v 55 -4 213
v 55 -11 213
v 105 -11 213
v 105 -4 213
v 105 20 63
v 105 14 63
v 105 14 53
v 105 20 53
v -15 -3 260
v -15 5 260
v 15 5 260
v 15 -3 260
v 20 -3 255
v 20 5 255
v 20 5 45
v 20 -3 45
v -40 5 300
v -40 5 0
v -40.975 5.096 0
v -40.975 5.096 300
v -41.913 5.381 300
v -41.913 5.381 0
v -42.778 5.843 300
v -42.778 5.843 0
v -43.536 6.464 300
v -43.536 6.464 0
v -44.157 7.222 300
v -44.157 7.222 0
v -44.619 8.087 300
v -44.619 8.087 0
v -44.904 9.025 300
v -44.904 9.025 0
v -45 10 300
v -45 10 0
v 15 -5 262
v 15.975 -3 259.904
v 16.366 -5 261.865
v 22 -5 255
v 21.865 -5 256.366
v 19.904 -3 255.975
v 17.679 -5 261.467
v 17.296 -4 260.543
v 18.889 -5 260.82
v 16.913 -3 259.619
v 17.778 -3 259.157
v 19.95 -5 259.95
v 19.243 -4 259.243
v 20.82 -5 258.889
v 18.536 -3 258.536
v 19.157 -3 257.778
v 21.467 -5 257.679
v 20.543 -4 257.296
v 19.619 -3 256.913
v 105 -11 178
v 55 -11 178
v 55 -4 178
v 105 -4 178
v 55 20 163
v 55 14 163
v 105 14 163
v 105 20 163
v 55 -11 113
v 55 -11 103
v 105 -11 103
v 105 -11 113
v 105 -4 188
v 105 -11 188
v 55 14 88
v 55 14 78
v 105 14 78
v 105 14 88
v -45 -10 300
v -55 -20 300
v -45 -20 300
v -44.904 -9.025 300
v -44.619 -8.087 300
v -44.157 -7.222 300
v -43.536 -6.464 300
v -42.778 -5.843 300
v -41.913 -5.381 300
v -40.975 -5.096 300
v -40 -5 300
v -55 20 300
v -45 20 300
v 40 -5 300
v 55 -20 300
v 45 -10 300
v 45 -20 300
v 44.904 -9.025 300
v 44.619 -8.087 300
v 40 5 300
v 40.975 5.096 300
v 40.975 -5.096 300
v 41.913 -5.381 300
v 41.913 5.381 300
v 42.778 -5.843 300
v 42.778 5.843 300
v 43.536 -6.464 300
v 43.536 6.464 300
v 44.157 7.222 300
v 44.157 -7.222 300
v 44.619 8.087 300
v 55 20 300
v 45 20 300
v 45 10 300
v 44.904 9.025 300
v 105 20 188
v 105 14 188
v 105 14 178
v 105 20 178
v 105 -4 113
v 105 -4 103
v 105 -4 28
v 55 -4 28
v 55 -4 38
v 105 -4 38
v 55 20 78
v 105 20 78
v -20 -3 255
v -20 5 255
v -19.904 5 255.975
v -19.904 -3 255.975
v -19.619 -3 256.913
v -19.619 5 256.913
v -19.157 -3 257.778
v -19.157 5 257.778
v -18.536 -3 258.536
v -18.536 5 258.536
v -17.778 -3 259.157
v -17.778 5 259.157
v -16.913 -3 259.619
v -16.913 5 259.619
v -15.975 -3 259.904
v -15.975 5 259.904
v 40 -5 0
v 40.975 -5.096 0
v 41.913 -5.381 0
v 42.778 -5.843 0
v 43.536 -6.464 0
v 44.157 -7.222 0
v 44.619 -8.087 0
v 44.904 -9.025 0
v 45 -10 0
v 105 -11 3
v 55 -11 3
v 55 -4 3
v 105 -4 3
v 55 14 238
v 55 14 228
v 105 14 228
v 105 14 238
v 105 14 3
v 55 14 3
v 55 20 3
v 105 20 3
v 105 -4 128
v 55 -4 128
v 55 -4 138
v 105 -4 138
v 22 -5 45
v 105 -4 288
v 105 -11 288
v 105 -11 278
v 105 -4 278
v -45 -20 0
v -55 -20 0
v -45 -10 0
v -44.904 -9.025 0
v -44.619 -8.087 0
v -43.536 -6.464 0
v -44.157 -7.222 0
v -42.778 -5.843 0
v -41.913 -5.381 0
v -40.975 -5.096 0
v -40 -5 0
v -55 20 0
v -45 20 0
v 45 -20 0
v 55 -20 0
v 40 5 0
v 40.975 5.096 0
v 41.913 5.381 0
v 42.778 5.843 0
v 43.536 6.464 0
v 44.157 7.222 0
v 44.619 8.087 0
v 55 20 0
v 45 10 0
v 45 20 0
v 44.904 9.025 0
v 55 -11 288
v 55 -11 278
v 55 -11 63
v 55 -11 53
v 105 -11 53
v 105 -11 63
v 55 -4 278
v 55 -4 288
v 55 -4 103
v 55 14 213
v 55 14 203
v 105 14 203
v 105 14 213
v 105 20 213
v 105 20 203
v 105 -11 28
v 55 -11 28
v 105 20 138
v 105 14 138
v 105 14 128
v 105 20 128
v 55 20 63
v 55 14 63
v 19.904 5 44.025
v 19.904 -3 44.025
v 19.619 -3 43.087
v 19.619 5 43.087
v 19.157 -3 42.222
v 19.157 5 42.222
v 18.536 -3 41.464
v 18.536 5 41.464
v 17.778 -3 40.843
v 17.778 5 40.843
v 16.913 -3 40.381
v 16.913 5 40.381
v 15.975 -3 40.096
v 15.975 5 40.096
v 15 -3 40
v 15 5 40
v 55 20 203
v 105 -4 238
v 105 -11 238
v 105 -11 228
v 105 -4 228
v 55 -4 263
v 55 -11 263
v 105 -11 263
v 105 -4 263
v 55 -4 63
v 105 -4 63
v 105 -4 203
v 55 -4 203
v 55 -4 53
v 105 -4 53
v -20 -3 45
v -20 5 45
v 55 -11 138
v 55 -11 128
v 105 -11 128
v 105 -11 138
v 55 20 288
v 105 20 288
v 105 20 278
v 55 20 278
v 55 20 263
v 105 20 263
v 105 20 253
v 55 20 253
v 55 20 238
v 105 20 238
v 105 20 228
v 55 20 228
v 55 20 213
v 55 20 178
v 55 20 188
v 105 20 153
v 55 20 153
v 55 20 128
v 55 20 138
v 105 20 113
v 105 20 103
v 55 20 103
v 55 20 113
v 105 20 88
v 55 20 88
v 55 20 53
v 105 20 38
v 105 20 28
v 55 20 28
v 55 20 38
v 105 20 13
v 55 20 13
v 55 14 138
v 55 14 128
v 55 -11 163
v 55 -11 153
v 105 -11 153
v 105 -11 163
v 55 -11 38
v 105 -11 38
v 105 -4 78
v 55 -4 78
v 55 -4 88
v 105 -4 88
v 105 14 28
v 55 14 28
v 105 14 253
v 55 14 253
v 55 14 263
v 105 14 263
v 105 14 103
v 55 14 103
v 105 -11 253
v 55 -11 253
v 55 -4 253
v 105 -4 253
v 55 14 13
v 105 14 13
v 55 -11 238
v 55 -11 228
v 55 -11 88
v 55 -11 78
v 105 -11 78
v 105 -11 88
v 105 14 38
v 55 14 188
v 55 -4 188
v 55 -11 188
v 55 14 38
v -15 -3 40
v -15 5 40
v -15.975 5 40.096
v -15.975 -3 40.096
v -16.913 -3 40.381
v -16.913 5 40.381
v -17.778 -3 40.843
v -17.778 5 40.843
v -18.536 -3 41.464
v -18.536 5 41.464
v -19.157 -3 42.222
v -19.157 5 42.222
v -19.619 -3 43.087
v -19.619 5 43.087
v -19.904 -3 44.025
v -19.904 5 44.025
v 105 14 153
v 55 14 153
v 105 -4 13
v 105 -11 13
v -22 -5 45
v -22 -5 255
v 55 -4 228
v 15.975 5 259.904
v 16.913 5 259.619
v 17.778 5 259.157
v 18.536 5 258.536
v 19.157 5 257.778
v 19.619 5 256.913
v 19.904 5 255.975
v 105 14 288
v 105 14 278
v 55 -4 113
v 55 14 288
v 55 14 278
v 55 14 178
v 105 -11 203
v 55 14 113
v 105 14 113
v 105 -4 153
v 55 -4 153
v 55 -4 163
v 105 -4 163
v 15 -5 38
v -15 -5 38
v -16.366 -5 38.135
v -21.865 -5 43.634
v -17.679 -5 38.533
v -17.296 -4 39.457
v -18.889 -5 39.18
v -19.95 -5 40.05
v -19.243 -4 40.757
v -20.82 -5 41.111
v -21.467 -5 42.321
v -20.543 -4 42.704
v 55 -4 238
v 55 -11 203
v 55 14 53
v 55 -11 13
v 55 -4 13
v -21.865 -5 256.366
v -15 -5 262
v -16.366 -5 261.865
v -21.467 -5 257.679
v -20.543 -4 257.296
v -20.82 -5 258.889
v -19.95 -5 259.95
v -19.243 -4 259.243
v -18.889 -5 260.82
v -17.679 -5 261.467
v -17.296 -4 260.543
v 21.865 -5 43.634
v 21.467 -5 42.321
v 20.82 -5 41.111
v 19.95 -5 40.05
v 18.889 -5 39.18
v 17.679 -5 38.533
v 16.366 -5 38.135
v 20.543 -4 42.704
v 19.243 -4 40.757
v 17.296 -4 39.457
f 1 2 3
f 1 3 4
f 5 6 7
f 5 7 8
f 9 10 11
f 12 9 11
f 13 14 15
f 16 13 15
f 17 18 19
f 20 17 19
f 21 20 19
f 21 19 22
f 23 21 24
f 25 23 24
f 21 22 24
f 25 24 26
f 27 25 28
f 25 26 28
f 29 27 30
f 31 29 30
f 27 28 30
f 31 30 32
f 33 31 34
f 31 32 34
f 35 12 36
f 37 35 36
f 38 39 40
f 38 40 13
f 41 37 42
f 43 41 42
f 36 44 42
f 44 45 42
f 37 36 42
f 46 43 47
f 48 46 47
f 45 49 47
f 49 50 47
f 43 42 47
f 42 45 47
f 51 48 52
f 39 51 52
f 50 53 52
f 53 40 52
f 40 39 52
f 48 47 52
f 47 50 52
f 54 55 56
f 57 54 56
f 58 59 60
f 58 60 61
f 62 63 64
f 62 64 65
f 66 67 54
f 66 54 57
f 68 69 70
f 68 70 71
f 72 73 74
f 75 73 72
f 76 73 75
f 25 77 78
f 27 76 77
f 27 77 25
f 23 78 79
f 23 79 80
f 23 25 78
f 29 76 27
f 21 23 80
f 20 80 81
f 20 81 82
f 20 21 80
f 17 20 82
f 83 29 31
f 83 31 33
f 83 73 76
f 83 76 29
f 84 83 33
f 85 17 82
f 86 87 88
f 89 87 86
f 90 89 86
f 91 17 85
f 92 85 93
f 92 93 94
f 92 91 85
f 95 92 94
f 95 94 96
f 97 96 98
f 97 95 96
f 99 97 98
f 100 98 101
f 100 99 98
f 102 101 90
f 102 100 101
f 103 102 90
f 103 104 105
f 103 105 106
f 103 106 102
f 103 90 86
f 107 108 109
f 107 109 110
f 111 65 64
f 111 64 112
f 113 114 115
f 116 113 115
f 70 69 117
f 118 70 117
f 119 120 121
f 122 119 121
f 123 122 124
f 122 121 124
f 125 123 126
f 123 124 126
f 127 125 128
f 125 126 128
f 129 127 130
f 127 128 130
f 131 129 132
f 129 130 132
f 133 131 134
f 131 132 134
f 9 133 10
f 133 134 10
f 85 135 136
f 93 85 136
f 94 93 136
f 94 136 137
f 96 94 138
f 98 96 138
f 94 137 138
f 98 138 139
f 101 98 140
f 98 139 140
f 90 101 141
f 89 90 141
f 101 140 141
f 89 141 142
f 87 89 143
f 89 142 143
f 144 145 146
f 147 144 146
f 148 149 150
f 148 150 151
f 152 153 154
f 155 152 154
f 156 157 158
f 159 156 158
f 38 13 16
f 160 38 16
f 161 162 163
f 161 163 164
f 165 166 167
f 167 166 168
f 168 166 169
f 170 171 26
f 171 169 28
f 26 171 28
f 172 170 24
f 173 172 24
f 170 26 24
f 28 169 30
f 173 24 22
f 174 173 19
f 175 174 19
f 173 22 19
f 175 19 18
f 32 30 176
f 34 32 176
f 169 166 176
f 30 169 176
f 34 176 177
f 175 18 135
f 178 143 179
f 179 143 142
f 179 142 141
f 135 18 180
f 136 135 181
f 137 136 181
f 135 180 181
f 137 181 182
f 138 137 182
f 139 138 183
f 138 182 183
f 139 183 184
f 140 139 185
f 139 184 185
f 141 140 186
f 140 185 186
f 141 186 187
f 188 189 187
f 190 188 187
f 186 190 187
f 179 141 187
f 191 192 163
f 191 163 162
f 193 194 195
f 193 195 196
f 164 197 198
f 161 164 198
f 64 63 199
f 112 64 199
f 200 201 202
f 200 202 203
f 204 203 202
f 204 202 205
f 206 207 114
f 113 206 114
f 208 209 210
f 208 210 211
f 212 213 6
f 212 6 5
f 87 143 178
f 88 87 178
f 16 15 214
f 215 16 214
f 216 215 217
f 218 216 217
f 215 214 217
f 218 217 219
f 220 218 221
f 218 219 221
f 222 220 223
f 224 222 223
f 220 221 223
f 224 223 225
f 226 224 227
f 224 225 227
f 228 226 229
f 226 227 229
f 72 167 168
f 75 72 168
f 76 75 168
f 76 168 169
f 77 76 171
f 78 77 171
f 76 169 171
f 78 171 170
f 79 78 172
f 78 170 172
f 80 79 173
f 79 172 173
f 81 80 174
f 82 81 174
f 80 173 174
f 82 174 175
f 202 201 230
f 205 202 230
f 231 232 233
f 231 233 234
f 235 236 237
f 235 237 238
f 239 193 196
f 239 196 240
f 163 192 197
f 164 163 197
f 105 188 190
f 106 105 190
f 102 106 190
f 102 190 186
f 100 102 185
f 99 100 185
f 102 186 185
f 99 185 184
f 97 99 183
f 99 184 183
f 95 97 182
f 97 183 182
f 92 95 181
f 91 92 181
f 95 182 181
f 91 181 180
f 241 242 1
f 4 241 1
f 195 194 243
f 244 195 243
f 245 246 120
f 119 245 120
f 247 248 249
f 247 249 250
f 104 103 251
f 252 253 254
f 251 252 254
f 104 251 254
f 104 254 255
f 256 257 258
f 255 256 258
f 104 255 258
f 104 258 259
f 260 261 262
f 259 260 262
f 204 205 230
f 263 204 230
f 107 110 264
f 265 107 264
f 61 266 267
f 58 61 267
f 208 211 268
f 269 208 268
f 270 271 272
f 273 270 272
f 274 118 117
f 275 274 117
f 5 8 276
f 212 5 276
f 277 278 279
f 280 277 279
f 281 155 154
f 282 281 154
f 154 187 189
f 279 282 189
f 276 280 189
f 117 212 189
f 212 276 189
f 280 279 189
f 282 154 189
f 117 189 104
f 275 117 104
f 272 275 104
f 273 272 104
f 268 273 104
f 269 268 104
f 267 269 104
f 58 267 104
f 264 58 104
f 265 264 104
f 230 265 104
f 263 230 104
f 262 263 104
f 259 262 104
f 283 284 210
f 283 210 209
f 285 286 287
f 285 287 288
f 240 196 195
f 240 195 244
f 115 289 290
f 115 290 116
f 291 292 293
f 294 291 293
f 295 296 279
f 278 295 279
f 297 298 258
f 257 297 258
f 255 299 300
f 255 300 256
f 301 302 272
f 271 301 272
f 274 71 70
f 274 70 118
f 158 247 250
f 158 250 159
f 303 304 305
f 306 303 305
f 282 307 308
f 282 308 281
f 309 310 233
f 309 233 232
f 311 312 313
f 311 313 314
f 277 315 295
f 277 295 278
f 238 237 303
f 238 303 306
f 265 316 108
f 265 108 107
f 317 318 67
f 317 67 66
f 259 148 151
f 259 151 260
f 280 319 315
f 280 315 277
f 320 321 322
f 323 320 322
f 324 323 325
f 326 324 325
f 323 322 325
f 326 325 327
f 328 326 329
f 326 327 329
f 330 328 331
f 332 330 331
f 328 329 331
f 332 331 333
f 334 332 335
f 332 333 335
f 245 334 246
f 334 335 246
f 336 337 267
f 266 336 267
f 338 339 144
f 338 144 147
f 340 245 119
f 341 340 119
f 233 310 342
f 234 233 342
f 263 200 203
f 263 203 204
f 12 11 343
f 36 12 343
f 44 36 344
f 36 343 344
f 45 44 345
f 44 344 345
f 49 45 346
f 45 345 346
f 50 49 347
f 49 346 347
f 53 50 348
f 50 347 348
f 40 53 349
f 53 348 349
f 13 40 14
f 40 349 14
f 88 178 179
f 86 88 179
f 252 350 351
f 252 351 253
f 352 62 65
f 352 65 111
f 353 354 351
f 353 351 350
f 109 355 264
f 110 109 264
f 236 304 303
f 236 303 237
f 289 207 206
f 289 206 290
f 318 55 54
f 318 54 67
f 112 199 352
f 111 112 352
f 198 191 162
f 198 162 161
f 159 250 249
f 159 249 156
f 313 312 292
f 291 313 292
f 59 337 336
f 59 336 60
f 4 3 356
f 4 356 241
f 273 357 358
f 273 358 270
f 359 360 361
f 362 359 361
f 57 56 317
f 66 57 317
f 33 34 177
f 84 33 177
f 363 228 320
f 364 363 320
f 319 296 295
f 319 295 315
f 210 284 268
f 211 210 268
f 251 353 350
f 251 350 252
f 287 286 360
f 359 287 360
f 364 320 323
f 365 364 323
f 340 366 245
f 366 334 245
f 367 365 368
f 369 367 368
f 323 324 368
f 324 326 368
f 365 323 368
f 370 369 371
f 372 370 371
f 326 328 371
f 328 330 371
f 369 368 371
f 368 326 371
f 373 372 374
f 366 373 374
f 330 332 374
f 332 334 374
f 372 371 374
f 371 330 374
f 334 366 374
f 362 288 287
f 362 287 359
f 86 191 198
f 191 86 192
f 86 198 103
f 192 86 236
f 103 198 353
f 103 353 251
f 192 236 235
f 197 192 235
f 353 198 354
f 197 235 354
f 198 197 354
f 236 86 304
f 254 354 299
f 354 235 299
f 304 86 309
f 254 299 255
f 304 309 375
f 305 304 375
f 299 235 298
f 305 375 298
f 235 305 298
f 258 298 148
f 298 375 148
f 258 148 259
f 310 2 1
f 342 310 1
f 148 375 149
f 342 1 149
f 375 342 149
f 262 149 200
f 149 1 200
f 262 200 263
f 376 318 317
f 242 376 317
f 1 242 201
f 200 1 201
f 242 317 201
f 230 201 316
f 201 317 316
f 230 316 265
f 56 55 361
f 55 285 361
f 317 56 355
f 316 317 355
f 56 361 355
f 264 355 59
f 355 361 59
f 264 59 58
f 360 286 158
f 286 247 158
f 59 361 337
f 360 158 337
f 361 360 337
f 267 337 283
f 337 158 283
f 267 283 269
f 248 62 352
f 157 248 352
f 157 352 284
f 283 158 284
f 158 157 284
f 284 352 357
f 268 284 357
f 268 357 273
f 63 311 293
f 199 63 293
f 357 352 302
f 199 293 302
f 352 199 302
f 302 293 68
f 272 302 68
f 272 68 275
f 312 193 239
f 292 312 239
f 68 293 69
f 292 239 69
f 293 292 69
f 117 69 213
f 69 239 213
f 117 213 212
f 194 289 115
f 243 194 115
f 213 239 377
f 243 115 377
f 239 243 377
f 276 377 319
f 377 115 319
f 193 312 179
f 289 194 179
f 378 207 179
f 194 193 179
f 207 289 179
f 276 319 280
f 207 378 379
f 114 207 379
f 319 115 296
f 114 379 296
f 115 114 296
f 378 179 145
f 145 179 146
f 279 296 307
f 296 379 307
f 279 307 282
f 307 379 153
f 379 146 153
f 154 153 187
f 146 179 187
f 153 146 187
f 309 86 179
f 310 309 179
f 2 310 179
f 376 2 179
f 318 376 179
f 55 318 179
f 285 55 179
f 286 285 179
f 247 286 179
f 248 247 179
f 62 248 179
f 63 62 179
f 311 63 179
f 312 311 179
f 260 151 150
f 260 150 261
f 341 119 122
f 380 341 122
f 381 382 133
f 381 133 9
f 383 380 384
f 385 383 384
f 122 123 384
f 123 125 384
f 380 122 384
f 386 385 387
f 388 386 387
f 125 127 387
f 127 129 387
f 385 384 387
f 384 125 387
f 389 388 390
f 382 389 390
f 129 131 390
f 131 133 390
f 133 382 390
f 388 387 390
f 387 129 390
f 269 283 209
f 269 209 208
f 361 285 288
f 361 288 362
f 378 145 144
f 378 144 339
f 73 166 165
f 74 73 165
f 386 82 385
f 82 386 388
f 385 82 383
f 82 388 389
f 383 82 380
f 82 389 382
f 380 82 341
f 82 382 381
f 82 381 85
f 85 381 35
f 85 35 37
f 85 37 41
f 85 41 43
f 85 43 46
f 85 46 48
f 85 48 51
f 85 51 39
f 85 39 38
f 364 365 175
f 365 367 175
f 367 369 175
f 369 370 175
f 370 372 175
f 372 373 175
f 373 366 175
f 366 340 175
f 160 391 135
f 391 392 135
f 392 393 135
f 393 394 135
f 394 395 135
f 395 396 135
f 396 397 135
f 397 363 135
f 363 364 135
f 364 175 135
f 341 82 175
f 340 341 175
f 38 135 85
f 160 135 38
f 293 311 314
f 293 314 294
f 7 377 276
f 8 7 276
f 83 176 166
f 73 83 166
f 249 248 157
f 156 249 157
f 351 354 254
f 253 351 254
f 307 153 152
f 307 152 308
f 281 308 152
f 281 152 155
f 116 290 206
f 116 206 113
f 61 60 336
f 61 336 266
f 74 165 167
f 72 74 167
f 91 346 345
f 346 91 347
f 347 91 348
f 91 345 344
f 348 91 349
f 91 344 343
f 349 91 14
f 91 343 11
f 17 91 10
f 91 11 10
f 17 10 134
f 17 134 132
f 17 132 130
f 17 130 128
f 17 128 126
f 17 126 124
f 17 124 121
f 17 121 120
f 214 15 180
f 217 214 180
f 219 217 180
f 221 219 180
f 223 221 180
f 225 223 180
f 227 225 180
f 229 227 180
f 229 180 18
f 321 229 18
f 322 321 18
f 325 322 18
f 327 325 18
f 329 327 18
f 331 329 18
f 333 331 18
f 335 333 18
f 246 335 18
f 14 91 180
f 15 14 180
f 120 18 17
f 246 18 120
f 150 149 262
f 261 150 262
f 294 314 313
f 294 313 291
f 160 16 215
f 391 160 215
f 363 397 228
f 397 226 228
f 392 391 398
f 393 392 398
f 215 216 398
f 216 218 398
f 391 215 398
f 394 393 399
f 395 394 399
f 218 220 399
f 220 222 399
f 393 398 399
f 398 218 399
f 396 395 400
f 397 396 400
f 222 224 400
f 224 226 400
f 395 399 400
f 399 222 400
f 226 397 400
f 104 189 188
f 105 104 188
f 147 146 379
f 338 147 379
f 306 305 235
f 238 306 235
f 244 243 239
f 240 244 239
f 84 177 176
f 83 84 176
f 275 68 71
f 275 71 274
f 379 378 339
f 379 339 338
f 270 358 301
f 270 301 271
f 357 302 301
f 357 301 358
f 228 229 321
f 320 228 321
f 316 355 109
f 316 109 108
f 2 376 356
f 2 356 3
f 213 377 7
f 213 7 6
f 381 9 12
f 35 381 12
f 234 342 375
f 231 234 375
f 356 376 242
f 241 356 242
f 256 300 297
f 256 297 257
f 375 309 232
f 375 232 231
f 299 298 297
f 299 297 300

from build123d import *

# Parameters (mm, degrees)
F1_DEPTH = 300
F3_DEPTH = 25
F4_SIZE  = 2
F5_W     = 7
F5_H     = 10
F5_W_2   = 6
F6_DEPTH = 50


with BuildPart() as f1:
    # F0 (on Top) → F1 (new body)
    with BuildSketch(Plane.XY):
        with BuildLine():
            Line((-40, -5), (0, -5))
            Line((0, -5), (40, -5))
            ThreePointArc((40, -5), (43.535534, -6.464466), (45, -10))
            Line((45, -10), (45, -20))
            Line((45, -20), (55, -20))
            Line((55, -20), (55, 20))
            Line((55, 20), (45, 20))
            Line((45, 20), (45, 10))
            ThreePointArc((45, 10), (43.535534, 6.464466), (40, 5))
            Line((40, 5), (0, 5))
            Line((0, 5), (-40, 5))
            ThreePointArc((-40, 5), (-43.535534, 6.464466), (-45, 10))
            Line((-45, 10), (-45, 20))
            Line((-45, 20), (-55, 20))
            Line((-55, 20), (-55, -20))
            Line((-55, -20), (-45, -20))
            Line((-45, -20), (-45, -10))
            ThreePointArc((-45, -10), (-43.535534, -6.464466), (-40, -5))
        make_face()
    extrude(amount=F1_DEPTH)

    # F2 (on face) → F3 (cut)
    with BuildSketch(Plane(origin=(0, 5, 0), x_dir=(-1, 0, 0), z_dir=(0, 1, 0))):
        with BuildLine():
            ThreePointArc((-20, 45), (-18.535534, 41.464466), (-15, 40))
            Line((-15, 40), (15, 40))
            ThreePointArc((15, 40), (18.535534, 41.464466), (20, 45))
            Line((20, 45), (20, 255))
            ThreePointArc((20, 255), (18.535534, 258.535534), (15, 260))
            Line((15, 260), (-15, 260))
            ThreePointArc((-15, 260), (-18.535534, 258.535534), (-20, 255))
            Line((-20, 255), (-20, 45))
        make_face()
    extrude(amount=-F3_DEPTH, mode=Mode.SUBTRACT)

    # F4
    f4_edges = [f1.edges().sort_by_distance(p)[0] for p in [
        (0, -5, 260),
    ]]
    chamfer(f4_edges, length=F4_SIZE)

    # F5 (on face) → F6 (join)
    with BuildSketch(Plane.YZ.offset(55)):
        with Locations((-7.5, 283)):
            Rectangle(F5_W, F5_H)
        with Locations((17, 283)):
            Rectangle(F5_W_2, F5_H)
        with Locations((-7.5, 258)):
            Rectangle(F5_W, F5_H)
        with Locations((17, 258)):
            Rectangle(F5_W_2, F5_H)
        with Locations((-7.5, 233)):
            Rectangle(F5_W, F5_H)
        with Locations((17, 233)):
            Rectangle(F5_W_2, F5_H)
        with Locations((-7.5, 208)):
            Rectangle(F5_W, F5_H)
        with Locations((17, 208)):
            Rectangle(F5_W_2, F5_H)
        with Locations((-7.5, 183)):
            Rectangle(F5_W, F5_H)
        with Locations((17, 183)):
            Rectangle(F5_W_2, F5_H)
        with Locations((-7.5, 158)):
            Rectangle(F5_W, F5_H)
        with Locations((17, 158)):
            Rectangle(F5_W_2, F5_H)
        with Locations((-7.5, 133)):
            Rectangle(F5_W, F5_H)
        with Locations((17, 133)):
            Rectangle(F5_W_2, F5_H)
        with Locations((-7.5, 108)):
            Rectangle(F5_W, F5_H)
        with Locations((17, 108)):
            Rectangle(F5_W_2, F5_H)
        with Locations((-7.5, 83)):
            Rectangle(F5_W, F5_H)
        with Locations((17, 83)):
            Rectangle(F5_W_2, F5_H)
        with Locations((-7.5, 58)):
            Rectangle(F5_W, F5_H)
        with Locations((17, 58)):
            Rectangle(F5_W_2, F5_H)
        with Locations((-7.5, 33)):
            Rectangle(F5_W, F5_H)
        with Locations((17, 33)):
            Rectangle(F5_W_2, F5_H)
        with Locations((-7.5, 8)):
            Rectangle(F5_W, F5_H)
        with Locations((17, 8)):
            Rectangle(F5_W_2, F5_H)
    extrude(amount=F6_DEPTH)


solid = f1.part
